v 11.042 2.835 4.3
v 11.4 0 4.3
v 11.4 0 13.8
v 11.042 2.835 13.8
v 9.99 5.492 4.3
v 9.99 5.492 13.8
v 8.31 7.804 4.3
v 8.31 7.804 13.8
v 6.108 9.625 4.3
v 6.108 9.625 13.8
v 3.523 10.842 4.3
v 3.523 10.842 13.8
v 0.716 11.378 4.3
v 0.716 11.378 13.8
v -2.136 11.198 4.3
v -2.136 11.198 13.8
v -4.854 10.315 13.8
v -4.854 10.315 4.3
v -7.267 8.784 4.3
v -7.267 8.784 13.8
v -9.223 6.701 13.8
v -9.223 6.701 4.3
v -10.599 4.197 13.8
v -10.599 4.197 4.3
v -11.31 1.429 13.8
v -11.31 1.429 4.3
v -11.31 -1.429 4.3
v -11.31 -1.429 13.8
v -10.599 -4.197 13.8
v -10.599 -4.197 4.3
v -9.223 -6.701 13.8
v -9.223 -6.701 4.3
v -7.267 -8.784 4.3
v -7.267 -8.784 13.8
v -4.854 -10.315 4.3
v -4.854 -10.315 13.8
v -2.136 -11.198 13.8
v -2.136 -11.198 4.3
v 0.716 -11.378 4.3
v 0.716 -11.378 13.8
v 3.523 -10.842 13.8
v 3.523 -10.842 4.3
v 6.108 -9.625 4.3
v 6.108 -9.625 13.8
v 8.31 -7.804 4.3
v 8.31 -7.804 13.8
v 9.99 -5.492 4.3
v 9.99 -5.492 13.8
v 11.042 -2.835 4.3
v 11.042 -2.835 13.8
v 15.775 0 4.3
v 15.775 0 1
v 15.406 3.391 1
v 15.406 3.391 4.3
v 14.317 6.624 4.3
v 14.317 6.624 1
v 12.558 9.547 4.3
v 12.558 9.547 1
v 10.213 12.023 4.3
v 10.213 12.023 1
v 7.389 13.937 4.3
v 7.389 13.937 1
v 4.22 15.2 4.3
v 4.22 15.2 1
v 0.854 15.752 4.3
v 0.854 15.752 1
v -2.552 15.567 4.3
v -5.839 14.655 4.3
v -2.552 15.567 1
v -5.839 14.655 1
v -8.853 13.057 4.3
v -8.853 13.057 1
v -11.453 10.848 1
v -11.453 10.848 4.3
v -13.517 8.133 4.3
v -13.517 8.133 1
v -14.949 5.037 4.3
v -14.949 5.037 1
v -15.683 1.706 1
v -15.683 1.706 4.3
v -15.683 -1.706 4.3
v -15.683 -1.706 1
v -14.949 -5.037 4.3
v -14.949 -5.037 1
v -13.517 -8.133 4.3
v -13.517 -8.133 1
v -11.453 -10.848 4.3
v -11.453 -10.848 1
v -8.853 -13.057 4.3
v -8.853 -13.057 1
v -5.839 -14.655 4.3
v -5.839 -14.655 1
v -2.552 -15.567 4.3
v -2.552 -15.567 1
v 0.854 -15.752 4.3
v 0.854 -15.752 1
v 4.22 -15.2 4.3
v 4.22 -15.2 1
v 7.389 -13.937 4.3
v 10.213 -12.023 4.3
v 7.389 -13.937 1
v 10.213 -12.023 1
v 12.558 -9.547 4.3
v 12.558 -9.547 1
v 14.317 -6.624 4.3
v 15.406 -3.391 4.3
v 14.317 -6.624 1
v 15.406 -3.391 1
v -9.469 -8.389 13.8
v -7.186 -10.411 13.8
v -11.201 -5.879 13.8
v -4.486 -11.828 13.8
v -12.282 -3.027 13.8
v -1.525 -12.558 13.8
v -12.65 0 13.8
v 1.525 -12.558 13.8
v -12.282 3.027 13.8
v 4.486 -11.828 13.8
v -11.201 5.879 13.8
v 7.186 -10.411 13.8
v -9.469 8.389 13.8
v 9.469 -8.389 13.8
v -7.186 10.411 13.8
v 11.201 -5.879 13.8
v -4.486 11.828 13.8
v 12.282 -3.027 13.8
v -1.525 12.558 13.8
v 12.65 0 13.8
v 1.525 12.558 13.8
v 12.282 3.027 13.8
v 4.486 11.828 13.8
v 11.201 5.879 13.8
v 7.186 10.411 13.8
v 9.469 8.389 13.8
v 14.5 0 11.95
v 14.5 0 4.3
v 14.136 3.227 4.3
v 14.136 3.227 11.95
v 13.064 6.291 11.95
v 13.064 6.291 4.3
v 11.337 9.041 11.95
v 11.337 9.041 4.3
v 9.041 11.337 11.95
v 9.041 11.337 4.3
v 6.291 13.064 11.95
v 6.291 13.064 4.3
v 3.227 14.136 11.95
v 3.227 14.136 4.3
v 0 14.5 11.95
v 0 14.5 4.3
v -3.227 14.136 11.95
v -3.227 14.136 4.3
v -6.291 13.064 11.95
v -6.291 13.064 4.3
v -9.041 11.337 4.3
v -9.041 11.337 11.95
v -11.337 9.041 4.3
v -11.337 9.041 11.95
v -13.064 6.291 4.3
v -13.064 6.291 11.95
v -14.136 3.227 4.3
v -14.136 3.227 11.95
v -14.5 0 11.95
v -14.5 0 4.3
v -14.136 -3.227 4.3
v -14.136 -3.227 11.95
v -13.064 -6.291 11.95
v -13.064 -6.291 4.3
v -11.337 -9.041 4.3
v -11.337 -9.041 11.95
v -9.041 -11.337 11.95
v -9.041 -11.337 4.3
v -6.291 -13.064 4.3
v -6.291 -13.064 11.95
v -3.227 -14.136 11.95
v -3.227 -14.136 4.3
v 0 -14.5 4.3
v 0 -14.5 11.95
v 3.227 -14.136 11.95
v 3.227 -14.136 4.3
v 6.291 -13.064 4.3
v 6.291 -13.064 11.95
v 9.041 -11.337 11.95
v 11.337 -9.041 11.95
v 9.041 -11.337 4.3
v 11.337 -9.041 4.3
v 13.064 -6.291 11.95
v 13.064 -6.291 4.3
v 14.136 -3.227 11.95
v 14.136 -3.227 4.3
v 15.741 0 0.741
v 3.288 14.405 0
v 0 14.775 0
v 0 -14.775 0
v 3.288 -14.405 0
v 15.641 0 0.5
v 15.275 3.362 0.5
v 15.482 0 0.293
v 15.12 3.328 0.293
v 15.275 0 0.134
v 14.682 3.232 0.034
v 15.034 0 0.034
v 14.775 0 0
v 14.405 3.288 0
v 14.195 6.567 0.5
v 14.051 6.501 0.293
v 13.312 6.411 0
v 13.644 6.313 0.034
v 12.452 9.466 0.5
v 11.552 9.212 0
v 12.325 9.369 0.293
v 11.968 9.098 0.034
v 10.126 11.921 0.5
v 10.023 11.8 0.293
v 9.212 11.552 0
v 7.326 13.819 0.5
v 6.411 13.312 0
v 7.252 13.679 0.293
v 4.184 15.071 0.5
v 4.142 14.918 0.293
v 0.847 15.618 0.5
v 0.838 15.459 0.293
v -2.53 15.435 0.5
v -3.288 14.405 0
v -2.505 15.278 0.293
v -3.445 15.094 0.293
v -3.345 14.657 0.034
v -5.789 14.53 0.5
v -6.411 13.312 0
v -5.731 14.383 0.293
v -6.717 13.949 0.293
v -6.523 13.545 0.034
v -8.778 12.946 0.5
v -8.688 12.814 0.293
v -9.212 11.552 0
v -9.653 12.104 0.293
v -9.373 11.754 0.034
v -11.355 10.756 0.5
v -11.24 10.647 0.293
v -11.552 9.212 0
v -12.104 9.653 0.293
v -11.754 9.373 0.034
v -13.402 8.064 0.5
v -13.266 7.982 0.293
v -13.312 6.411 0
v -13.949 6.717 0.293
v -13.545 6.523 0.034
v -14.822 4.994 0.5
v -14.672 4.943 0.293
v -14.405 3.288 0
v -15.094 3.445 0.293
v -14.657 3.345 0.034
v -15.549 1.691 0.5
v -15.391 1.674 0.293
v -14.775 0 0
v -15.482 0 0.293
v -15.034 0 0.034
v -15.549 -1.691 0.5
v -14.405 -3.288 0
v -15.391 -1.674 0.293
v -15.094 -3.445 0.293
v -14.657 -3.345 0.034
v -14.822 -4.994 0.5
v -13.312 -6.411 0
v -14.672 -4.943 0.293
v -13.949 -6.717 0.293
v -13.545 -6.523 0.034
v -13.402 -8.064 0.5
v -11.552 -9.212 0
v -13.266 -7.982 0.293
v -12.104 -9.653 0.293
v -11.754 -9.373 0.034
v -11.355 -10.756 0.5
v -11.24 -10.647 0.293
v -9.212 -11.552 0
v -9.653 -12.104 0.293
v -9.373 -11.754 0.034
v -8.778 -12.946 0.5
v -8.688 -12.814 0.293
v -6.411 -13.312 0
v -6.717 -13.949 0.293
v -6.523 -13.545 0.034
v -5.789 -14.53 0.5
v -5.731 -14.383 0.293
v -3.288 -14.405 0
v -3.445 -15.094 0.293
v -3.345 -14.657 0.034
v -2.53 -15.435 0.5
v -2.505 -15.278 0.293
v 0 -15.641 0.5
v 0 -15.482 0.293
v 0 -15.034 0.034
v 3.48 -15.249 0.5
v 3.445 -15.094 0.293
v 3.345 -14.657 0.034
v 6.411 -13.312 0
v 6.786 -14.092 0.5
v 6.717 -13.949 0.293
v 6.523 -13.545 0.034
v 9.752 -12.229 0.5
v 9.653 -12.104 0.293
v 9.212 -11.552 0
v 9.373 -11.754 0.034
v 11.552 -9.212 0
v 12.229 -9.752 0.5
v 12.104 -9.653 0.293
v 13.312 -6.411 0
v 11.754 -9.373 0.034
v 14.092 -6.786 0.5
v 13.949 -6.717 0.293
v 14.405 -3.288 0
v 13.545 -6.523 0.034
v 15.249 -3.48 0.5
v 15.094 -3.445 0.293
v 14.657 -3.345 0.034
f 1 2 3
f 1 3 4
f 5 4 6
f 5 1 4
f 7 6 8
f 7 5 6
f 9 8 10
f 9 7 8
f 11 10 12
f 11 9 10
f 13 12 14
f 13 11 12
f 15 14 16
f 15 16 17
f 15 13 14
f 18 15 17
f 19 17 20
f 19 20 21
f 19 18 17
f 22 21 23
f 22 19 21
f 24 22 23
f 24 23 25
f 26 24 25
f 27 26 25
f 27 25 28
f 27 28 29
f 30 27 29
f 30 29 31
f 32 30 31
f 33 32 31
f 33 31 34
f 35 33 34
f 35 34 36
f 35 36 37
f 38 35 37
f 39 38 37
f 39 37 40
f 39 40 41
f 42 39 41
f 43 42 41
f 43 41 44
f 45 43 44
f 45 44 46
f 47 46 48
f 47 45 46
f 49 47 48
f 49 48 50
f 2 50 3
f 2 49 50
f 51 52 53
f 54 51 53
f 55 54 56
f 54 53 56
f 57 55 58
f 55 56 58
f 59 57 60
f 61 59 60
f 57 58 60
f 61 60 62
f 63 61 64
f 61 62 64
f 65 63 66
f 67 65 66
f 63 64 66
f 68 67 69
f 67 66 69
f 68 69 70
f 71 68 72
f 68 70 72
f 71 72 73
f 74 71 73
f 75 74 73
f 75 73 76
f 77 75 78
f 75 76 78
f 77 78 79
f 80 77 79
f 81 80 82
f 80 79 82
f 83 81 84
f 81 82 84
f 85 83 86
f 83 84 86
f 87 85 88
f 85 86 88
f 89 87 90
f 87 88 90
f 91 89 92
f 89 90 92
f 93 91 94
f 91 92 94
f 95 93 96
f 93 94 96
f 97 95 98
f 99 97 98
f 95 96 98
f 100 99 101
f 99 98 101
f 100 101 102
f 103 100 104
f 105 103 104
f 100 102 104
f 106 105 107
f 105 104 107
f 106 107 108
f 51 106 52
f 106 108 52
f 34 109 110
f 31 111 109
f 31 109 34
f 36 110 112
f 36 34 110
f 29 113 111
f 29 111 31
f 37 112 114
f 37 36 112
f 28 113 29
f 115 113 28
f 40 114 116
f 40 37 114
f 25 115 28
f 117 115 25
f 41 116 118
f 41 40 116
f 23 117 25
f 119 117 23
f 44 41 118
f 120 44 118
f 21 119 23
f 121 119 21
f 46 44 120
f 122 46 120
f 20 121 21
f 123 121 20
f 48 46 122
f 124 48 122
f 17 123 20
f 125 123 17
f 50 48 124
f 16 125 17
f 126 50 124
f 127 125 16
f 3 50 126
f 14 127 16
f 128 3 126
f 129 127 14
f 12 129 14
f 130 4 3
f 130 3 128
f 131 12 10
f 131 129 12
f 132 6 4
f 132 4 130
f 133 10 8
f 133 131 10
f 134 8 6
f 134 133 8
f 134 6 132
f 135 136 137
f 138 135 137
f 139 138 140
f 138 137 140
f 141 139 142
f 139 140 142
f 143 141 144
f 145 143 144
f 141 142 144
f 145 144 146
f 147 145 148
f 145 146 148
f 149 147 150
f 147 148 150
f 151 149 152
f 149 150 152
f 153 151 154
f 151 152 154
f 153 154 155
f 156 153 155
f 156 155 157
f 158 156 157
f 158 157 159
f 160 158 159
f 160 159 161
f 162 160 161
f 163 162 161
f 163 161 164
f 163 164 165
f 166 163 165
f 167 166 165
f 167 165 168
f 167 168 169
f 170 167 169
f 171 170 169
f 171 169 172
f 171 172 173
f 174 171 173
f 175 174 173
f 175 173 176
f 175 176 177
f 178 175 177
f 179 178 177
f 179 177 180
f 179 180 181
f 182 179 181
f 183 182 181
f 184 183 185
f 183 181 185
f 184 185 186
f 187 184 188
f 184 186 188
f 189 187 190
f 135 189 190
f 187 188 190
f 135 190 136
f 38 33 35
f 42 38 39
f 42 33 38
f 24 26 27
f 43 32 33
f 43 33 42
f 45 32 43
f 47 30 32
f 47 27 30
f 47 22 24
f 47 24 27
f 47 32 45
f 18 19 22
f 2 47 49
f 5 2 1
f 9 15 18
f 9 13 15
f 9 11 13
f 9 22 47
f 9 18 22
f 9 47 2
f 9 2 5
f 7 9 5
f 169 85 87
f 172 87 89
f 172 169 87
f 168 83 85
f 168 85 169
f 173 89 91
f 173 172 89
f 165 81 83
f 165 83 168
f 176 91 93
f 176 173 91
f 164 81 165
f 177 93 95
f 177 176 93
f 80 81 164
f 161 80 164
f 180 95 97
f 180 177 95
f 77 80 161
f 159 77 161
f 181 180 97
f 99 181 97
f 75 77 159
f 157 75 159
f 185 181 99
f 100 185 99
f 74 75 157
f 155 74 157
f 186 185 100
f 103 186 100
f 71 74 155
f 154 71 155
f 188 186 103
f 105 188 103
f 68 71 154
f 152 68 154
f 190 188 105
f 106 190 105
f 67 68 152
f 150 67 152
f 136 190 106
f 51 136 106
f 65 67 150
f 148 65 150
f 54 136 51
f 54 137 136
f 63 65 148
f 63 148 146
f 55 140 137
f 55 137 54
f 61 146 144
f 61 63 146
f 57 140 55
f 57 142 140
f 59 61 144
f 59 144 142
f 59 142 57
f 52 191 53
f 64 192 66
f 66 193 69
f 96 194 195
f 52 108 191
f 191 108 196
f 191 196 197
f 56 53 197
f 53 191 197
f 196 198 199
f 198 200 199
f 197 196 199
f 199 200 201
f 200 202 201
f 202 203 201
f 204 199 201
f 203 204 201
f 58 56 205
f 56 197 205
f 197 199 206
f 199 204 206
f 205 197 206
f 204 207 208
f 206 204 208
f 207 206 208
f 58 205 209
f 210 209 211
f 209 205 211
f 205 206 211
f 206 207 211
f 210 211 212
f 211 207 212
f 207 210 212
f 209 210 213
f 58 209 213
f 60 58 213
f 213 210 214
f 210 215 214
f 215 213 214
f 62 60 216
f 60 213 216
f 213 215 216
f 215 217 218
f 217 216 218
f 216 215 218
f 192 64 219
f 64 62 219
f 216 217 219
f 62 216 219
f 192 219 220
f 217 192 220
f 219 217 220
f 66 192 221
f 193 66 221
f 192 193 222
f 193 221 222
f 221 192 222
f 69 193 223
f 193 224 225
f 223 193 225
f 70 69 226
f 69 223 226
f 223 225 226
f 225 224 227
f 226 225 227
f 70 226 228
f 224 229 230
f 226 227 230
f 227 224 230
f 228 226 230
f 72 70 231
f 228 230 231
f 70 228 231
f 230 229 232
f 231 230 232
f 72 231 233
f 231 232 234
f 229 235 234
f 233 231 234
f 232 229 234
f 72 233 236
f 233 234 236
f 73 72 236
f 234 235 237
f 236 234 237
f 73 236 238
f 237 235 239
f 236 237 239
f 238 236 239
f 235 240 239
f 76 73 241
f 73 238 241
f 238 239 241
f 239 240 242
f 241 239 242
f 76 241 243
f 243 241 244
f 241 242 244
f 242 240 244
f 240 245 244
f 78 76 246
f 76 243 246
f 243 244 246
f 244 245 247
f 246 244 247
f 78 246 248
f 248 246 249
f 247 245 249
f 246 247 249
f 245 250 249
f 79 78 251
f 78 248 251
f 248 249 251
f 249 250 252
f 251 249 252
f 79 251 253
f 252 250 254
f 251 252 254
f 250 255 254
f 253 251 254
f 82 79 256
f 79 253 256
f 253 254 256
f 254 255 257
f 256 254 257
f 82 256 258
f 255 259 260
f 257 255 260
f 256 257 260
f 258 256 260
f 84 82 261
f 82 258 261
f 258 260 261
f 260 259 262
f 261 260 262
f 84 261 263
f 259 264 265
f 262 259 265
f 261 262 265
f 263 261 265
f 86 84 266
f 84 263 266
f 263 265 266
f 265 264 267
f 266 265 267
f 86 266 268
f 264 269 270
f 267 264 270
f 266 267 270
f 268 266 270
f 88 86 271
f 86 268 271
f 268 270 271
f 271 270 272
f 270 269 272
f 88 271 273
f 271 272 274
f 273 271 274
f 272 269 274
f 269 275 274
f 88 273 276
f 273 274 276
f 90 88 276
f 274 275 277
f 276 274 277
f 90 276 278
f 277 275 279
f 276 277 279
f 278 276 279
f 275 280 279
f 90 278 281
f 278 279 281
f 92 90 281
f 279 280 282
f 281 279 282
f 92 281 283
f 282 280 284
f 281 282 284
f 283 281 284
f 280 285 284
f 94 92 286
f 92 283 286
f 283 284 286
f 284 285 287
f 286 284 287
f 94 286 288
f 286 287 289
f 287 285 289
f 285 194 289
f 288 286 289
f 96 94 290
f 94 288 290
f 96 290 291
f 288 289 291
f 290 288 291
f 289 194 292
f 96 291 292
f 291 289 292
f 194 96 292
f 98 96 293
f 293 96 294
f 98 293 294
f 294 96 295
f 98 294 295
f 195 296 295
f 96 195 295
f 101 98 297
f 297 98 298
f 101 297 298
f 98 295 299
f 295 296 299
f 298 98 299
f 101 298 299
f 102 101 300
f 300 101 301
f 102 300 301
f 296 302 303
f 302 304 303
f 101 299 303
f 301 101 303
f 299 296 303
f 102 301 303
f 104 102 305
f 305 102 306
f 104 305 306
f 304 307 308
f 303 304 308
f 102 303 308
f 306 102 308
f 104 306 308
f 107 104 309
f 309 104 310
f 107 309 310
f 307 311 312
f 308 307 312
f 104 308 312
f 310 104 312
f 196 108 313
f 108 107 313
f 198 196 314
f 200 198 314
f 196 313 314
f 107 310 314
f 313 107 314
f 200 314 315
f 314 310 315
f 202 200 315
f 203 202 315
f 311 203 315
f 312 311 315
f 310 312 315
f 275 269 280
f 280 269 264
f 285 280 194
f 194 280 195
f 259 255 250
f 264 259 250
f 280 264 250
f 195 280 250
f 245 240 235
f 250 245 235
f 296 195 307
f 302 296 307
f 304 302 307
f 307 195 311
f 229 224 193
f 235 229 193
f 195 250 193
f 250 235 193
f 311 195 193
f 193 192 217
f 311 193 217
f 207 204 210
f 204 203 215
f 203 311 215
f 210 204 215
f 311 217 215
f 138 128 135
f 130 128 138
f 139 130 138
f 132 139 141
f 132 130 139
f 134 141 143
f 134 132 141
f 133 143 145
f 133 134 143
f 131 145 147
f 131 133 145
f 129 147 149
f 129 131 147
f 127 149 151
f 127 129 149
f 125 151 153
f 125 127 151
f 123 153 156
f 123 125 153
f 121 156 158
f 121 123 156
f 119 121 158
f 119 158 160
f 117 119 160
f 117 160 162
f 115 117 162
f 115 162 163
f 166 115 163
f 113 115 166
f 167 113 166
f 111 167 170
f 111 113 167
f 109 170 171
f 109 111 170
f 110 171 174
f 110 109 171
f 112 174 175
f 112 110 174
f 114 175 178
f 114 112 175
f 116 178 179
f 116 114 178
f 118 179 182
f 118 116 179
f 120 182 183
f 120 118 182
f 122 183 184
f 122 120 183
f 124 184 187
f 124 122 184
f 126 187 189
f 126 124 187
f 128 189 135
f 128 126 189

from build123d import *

# Parameters (mm, degrees)
F0_R     = 15.775
F0_R_2   = 14.5
F0_R_3   = 11.4
F1_DEPTH = 4.3
F2_DEPTH = 13.8
F3_SIZE  = 1.85
F4_R     = 1


with BuildPart() as f1:
    # F0 (on Top) → F1 (new body)
    with BuildSketch(Plane.XY):
        Circle(F0_R)
        Circle(F0_R_2, mode=Mode.SUBTRACT)
        Circle(F0_R_2)
        Circle(F0_R_3, mode=Mode.SUBTRACT)
        Circle(F0_R_3)
    extrude(amount=F1_DEPTH)

    # F0 (on Top) → F2 (join)
    with BuildSketch(Plane.XY):
        Circle(F0_R_2)
        Circle(F0_R_3, mode=Mode.SUBTRACT)
    extrude(amount=F2_DEPTH)

    # F3
    f3_edges = [f1.edges().sort_by_distance(p)[0] for p in [
        (-14.5, 0, 13.8),
    ]]
    chamfer(f3_edges, length=F3_SIZE)

    # F4
    f4_edges = [f1.edges().sort_by_distance(p)[0] for p in [
        (-15.775, 0, 0),
    ]]
    fillet(f4_edges, radius=F4_R)


solid = f1.part
